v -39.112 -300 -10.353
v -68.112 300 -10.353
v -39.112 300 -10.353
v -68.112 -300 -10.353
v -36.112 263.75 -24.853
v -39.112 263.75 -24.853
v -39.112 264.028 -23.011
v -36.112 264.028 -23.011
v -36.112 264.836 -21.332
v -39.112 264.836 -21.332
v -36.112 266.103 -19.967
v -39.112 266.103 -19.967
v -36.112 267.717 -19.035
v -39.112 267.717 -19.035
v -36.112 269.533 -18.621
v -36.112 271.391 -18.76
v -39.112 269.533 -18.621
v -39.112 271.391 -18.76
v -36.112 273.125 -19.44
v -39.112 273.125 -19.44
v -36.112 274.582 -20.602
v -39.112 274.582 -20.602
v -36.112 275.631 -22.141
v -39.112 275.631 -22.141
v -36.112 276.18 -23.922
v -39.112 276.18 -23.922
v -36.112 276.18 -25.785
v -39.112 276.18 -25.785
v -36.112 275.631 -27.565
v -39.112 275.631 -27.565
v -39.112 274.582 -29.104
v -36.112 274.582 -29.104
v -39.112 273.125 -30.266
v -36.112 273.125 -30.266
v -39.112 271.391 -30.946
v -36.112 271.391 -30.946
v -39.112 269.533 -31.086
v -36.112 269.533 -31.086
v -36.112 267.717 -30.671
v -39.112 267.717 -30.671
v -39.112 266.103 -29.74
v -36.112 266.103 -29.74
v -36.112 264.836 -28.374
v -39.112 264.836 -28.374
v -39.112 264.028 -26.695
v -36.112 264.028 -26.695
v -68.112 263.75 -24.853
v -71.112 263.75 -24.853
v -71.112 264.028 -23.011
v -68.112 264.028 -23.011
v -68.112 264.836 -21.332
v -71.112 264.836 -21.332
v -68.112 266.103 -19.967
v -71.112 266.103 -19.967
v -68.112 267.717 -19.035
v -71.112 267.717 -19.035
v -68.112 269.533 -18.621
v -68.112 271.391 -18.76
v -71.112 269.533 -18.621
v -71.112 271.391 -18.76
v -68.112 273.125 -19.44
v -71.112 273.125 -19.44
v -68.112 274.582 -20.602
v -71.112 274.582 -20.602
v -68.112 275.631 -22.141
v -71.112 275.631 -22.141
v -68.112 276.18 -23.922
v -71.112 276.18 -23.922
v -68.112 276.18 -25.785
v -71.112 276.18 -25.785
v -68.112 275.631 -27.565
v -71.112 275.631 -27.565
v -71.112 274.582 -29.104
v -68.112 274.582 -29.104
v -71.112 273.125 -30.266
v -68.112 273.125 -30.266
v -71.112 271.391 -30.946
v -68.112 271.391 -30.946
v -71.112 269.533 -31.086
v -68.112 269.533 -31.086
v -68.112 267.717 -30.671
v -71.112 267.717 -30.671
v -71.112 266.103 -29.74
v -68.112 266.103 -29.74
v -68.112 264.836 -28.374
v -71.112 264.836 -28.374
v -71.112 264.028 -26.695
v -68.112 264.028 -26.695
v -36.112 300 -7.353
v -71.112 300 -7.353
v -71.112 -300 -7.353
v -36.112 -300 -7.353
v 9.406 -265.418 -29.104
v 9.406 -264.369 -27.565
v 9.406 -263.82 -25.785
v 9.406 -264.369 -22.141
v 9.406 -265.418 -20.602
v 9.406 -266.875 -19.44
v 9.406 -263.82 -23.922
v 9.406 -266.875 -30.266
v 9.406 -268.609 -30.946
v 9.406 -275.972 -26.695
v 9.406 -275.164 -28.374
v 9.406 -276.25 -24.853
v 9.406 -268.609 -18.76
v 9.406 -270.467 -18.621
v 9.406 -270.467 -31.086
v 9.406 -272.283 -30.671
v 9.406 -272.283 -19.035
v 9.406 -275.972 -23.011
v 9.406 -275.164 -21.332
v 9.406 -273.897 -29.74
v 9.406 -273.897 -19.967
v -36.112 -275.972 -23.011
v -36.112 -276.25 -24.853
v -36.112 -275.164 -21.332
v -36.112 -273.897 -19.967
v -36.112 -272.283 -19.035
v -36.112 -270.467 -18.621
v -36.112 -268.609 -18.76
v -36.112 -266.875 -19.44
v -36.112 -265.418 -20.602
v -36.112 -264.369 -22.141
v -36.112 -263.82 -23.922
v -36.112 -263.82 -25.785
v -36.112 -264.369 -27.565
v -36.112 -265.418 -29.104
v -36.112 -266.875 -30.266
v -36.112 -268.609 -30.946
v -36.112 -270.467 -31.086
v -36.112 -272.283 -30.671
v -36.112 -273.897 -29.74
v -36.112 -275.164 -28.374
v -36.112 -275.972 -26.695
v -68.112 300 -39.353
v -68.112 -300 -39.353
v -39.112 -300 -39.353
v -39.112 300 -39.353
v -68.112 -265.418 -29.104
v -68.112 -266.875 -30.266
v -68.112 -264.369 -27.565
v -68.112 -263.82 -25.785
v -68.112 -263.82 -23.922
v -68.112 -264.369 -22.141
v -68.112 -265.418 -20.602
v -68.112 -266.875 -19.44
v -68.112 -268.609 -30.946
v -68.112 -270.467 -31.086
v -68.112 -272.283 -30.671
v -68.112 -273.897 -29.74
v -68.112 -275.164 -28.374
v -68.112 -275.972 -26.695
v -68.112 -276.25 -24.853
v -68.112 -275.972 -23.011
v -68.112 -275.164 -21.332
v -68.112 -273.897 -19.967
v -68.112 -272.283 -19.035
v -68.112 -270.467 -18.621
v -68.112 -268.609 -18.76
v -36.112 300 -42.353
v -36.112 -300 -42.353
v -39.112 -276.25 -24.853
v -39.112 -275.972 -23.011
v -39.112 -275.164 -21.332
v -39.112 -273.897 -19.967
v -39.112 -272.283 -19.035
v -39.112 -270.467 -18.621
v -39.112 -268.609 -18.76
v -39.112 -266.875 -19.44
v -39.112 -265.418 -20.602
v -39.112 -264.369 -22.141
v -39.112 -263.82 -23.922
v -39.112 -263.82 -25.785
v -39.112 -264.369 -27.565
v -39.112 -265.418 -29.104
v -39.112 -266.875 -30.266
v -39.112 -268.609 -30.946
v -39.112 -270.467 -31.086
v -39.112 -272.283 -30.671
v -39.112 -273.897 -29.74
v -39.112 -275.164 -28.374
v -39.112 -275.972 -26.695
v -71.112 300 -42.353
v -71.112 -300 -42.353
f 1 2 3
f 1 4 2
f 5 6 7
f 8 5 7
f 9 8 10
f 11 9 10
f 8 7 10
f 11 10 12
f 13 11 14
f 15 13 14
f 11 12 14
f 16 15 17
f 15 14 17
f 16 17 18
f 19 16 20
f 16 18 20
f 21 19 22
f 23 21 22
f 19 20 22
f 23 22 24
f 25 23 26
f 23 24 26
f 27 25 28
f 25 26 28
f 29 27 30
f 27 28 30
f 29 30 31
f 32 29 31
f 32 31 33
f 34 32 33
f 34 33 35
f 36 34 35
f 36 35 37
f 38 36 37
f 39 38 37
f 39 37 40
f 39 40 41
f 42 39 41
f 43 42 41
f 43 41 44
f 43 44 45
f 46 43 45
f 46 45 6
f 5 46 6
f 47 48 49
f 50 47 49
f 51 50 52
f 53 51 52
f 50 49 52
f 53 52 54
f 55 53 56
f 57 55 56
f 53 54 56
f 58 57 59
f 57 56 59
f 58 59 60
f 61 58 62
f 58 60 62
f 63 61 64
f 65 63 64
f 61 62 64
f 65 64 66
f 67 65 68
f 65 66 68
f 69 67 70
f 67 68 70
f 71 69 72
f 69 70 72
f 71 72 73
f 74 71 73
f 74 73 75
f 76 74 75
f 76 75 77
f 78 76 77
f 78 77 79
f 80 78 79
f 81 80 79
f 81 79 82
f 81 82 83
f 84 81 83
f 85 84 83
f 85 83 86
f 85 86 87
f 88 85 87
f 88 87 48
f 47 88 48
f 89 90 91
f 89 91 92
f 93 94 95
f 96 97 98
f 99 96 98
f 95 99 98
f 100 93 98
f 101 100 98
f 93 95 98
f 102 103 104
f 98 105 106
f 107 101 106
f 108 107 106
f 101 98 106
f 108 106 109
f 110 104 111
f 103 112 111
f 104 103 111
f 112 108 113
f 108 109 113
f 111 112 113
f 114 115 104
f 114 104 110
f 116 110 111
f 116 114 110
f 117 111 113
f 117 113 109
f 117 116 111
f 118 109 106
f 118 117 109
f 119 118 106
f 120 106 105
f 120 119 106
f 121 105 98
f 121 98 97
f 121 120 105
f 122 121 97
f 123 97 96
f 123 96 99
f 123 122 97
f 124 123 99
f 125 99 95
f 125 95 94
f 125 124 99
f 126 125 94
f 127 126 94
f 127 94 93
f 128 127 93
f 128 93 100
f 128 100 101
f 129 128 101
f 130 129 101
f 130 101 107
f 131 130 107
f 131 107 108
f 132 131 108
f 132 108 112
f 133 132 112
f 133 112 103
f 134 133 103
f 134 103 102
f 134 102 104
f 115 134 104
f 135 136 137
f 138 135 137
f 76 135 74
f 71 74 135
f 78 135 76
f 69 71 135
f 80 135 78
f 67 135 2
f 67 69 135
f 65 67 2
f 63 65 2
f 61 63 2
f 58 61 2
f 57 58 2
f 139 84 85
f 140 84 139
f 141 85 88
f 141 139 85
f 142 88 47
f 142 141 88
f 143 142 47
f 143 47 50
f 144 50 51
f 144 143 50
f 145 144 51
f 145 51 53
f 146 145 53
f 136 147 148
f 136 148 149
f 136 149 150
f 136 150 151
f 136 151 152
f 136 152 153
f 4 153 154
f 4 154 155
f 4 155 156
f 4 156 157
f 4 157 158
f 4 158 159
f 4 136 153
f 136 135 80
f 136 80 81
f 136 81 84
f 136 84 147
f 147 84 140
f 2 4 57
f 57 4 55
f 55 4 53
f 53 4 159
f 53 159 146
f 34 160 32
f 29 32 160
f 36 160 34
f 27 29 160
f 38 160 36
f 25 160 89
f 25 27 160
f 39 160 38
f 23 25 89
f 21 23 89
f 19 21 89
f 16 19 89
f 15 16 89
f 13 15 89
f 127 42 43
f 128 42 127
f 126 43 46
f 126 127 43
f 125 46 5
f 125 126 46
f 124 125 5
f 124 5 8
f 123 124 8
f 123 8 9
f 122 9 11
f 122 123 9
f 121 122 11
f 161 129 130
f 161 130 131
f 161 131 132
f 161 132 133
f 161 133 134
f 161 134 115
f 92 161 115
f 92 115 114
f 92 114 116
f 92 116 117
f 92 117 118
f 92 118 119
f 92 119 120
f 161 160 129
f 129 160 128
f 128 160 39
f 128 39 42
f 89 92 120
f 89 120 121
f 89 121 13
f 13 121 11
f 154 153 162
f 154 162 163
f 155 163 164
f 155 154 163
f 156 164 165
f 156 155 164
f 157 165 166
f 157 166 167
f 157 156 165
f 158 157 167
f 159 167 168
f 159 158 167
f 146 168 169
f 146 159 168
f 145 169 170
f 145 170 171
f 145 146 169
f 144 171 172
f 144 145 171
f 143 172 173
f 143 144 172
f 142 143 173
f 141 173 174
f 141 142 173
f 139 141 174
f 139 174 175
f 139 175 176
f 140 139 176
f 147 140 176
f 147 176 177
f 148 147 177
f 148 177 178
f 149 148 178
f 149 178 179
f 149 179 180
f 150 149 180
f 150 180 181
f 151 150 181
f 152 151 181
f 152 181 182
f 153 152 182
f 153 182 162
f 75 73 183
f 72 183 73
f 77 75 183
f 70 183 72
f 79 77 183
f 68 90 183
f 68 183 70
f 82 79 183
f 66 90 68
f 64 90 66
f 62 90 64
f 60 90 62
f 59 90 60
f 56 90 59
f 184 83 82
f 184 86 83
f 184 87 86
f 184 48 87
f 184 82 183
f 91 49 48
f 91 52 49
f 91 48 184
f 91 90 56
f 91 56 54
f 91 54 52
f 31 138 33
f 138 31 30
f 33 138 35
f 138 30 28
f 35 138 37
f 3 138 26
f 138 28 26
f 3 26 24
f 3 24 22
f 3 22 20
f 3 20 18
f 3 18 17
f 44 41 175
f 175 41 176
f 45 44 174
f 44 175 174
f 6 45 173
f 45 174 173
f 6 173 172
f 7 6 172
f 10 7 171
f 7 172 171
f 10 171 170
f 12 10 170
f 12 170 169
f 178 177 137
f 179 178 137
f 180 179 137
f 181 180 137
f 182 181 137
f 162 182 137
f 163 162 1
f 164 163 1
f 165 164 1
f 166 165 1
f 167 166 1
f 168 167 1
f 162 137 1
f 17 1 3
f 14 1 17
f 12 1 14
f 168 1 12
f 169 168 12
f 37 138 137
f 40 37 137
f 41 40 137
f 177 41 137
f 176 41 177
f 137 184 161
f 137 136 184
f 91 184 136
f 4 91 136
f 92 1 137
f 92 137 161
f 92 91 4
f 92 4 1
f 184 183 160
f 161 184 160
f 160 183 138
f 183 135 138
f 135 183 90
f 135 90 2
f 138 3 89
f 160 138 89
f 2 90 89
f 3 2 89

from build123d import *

# Parameters (mm, degrees)
F0_W     = 35
F0_H     = 35
F0_W_2   = 29
F0_H_2   = 29
F1_DEPTH = 300
F2_R     = 6.25
F3_DEPTH = 35.56
F4_DEPTH = 80.518


with BuildPart() as f1:
    # F0 (on Front) → F1 (new body, symmetric)
    with BuildSketch(Plane.XZ):
        with Locations((-53.6115857959, -24.8530973494)):
            Rectangle(F0_W, F0_H)
        with Locations((-53.6115857959, -24.8530973494)):
            Rectangle(F0_W_2, F0_H_2, mode=Mode.SUBTRACT)
    extrude(amount=F1_DEPTH, both=True)

    # F2 (on face) → F3 (cut)
    with BuildSketch(Plane(origin=(-71.1115857959, 0, 0), x_dir=(0, -1, 0), z_dir=(-1, 0, 0))):
        with Locations((-270, -24.8530973494)):
            Circle(F2_R)
    extrude(amount=-F3_DEPTH, mode=Mode.SUBTRACT)

    # F2 (on face) → F4 (join)
    with BuildSketch(Plane(origin=(-71.1115857959, 0, 0), x_dir=(0, -1, 0), z_dir=(-1, 0, 0))):
        with Locations((270, -24.8530973494)):
            Circle(F2_R)
    extrude(amount=-F4_DEPTH)


solid = f1.part
